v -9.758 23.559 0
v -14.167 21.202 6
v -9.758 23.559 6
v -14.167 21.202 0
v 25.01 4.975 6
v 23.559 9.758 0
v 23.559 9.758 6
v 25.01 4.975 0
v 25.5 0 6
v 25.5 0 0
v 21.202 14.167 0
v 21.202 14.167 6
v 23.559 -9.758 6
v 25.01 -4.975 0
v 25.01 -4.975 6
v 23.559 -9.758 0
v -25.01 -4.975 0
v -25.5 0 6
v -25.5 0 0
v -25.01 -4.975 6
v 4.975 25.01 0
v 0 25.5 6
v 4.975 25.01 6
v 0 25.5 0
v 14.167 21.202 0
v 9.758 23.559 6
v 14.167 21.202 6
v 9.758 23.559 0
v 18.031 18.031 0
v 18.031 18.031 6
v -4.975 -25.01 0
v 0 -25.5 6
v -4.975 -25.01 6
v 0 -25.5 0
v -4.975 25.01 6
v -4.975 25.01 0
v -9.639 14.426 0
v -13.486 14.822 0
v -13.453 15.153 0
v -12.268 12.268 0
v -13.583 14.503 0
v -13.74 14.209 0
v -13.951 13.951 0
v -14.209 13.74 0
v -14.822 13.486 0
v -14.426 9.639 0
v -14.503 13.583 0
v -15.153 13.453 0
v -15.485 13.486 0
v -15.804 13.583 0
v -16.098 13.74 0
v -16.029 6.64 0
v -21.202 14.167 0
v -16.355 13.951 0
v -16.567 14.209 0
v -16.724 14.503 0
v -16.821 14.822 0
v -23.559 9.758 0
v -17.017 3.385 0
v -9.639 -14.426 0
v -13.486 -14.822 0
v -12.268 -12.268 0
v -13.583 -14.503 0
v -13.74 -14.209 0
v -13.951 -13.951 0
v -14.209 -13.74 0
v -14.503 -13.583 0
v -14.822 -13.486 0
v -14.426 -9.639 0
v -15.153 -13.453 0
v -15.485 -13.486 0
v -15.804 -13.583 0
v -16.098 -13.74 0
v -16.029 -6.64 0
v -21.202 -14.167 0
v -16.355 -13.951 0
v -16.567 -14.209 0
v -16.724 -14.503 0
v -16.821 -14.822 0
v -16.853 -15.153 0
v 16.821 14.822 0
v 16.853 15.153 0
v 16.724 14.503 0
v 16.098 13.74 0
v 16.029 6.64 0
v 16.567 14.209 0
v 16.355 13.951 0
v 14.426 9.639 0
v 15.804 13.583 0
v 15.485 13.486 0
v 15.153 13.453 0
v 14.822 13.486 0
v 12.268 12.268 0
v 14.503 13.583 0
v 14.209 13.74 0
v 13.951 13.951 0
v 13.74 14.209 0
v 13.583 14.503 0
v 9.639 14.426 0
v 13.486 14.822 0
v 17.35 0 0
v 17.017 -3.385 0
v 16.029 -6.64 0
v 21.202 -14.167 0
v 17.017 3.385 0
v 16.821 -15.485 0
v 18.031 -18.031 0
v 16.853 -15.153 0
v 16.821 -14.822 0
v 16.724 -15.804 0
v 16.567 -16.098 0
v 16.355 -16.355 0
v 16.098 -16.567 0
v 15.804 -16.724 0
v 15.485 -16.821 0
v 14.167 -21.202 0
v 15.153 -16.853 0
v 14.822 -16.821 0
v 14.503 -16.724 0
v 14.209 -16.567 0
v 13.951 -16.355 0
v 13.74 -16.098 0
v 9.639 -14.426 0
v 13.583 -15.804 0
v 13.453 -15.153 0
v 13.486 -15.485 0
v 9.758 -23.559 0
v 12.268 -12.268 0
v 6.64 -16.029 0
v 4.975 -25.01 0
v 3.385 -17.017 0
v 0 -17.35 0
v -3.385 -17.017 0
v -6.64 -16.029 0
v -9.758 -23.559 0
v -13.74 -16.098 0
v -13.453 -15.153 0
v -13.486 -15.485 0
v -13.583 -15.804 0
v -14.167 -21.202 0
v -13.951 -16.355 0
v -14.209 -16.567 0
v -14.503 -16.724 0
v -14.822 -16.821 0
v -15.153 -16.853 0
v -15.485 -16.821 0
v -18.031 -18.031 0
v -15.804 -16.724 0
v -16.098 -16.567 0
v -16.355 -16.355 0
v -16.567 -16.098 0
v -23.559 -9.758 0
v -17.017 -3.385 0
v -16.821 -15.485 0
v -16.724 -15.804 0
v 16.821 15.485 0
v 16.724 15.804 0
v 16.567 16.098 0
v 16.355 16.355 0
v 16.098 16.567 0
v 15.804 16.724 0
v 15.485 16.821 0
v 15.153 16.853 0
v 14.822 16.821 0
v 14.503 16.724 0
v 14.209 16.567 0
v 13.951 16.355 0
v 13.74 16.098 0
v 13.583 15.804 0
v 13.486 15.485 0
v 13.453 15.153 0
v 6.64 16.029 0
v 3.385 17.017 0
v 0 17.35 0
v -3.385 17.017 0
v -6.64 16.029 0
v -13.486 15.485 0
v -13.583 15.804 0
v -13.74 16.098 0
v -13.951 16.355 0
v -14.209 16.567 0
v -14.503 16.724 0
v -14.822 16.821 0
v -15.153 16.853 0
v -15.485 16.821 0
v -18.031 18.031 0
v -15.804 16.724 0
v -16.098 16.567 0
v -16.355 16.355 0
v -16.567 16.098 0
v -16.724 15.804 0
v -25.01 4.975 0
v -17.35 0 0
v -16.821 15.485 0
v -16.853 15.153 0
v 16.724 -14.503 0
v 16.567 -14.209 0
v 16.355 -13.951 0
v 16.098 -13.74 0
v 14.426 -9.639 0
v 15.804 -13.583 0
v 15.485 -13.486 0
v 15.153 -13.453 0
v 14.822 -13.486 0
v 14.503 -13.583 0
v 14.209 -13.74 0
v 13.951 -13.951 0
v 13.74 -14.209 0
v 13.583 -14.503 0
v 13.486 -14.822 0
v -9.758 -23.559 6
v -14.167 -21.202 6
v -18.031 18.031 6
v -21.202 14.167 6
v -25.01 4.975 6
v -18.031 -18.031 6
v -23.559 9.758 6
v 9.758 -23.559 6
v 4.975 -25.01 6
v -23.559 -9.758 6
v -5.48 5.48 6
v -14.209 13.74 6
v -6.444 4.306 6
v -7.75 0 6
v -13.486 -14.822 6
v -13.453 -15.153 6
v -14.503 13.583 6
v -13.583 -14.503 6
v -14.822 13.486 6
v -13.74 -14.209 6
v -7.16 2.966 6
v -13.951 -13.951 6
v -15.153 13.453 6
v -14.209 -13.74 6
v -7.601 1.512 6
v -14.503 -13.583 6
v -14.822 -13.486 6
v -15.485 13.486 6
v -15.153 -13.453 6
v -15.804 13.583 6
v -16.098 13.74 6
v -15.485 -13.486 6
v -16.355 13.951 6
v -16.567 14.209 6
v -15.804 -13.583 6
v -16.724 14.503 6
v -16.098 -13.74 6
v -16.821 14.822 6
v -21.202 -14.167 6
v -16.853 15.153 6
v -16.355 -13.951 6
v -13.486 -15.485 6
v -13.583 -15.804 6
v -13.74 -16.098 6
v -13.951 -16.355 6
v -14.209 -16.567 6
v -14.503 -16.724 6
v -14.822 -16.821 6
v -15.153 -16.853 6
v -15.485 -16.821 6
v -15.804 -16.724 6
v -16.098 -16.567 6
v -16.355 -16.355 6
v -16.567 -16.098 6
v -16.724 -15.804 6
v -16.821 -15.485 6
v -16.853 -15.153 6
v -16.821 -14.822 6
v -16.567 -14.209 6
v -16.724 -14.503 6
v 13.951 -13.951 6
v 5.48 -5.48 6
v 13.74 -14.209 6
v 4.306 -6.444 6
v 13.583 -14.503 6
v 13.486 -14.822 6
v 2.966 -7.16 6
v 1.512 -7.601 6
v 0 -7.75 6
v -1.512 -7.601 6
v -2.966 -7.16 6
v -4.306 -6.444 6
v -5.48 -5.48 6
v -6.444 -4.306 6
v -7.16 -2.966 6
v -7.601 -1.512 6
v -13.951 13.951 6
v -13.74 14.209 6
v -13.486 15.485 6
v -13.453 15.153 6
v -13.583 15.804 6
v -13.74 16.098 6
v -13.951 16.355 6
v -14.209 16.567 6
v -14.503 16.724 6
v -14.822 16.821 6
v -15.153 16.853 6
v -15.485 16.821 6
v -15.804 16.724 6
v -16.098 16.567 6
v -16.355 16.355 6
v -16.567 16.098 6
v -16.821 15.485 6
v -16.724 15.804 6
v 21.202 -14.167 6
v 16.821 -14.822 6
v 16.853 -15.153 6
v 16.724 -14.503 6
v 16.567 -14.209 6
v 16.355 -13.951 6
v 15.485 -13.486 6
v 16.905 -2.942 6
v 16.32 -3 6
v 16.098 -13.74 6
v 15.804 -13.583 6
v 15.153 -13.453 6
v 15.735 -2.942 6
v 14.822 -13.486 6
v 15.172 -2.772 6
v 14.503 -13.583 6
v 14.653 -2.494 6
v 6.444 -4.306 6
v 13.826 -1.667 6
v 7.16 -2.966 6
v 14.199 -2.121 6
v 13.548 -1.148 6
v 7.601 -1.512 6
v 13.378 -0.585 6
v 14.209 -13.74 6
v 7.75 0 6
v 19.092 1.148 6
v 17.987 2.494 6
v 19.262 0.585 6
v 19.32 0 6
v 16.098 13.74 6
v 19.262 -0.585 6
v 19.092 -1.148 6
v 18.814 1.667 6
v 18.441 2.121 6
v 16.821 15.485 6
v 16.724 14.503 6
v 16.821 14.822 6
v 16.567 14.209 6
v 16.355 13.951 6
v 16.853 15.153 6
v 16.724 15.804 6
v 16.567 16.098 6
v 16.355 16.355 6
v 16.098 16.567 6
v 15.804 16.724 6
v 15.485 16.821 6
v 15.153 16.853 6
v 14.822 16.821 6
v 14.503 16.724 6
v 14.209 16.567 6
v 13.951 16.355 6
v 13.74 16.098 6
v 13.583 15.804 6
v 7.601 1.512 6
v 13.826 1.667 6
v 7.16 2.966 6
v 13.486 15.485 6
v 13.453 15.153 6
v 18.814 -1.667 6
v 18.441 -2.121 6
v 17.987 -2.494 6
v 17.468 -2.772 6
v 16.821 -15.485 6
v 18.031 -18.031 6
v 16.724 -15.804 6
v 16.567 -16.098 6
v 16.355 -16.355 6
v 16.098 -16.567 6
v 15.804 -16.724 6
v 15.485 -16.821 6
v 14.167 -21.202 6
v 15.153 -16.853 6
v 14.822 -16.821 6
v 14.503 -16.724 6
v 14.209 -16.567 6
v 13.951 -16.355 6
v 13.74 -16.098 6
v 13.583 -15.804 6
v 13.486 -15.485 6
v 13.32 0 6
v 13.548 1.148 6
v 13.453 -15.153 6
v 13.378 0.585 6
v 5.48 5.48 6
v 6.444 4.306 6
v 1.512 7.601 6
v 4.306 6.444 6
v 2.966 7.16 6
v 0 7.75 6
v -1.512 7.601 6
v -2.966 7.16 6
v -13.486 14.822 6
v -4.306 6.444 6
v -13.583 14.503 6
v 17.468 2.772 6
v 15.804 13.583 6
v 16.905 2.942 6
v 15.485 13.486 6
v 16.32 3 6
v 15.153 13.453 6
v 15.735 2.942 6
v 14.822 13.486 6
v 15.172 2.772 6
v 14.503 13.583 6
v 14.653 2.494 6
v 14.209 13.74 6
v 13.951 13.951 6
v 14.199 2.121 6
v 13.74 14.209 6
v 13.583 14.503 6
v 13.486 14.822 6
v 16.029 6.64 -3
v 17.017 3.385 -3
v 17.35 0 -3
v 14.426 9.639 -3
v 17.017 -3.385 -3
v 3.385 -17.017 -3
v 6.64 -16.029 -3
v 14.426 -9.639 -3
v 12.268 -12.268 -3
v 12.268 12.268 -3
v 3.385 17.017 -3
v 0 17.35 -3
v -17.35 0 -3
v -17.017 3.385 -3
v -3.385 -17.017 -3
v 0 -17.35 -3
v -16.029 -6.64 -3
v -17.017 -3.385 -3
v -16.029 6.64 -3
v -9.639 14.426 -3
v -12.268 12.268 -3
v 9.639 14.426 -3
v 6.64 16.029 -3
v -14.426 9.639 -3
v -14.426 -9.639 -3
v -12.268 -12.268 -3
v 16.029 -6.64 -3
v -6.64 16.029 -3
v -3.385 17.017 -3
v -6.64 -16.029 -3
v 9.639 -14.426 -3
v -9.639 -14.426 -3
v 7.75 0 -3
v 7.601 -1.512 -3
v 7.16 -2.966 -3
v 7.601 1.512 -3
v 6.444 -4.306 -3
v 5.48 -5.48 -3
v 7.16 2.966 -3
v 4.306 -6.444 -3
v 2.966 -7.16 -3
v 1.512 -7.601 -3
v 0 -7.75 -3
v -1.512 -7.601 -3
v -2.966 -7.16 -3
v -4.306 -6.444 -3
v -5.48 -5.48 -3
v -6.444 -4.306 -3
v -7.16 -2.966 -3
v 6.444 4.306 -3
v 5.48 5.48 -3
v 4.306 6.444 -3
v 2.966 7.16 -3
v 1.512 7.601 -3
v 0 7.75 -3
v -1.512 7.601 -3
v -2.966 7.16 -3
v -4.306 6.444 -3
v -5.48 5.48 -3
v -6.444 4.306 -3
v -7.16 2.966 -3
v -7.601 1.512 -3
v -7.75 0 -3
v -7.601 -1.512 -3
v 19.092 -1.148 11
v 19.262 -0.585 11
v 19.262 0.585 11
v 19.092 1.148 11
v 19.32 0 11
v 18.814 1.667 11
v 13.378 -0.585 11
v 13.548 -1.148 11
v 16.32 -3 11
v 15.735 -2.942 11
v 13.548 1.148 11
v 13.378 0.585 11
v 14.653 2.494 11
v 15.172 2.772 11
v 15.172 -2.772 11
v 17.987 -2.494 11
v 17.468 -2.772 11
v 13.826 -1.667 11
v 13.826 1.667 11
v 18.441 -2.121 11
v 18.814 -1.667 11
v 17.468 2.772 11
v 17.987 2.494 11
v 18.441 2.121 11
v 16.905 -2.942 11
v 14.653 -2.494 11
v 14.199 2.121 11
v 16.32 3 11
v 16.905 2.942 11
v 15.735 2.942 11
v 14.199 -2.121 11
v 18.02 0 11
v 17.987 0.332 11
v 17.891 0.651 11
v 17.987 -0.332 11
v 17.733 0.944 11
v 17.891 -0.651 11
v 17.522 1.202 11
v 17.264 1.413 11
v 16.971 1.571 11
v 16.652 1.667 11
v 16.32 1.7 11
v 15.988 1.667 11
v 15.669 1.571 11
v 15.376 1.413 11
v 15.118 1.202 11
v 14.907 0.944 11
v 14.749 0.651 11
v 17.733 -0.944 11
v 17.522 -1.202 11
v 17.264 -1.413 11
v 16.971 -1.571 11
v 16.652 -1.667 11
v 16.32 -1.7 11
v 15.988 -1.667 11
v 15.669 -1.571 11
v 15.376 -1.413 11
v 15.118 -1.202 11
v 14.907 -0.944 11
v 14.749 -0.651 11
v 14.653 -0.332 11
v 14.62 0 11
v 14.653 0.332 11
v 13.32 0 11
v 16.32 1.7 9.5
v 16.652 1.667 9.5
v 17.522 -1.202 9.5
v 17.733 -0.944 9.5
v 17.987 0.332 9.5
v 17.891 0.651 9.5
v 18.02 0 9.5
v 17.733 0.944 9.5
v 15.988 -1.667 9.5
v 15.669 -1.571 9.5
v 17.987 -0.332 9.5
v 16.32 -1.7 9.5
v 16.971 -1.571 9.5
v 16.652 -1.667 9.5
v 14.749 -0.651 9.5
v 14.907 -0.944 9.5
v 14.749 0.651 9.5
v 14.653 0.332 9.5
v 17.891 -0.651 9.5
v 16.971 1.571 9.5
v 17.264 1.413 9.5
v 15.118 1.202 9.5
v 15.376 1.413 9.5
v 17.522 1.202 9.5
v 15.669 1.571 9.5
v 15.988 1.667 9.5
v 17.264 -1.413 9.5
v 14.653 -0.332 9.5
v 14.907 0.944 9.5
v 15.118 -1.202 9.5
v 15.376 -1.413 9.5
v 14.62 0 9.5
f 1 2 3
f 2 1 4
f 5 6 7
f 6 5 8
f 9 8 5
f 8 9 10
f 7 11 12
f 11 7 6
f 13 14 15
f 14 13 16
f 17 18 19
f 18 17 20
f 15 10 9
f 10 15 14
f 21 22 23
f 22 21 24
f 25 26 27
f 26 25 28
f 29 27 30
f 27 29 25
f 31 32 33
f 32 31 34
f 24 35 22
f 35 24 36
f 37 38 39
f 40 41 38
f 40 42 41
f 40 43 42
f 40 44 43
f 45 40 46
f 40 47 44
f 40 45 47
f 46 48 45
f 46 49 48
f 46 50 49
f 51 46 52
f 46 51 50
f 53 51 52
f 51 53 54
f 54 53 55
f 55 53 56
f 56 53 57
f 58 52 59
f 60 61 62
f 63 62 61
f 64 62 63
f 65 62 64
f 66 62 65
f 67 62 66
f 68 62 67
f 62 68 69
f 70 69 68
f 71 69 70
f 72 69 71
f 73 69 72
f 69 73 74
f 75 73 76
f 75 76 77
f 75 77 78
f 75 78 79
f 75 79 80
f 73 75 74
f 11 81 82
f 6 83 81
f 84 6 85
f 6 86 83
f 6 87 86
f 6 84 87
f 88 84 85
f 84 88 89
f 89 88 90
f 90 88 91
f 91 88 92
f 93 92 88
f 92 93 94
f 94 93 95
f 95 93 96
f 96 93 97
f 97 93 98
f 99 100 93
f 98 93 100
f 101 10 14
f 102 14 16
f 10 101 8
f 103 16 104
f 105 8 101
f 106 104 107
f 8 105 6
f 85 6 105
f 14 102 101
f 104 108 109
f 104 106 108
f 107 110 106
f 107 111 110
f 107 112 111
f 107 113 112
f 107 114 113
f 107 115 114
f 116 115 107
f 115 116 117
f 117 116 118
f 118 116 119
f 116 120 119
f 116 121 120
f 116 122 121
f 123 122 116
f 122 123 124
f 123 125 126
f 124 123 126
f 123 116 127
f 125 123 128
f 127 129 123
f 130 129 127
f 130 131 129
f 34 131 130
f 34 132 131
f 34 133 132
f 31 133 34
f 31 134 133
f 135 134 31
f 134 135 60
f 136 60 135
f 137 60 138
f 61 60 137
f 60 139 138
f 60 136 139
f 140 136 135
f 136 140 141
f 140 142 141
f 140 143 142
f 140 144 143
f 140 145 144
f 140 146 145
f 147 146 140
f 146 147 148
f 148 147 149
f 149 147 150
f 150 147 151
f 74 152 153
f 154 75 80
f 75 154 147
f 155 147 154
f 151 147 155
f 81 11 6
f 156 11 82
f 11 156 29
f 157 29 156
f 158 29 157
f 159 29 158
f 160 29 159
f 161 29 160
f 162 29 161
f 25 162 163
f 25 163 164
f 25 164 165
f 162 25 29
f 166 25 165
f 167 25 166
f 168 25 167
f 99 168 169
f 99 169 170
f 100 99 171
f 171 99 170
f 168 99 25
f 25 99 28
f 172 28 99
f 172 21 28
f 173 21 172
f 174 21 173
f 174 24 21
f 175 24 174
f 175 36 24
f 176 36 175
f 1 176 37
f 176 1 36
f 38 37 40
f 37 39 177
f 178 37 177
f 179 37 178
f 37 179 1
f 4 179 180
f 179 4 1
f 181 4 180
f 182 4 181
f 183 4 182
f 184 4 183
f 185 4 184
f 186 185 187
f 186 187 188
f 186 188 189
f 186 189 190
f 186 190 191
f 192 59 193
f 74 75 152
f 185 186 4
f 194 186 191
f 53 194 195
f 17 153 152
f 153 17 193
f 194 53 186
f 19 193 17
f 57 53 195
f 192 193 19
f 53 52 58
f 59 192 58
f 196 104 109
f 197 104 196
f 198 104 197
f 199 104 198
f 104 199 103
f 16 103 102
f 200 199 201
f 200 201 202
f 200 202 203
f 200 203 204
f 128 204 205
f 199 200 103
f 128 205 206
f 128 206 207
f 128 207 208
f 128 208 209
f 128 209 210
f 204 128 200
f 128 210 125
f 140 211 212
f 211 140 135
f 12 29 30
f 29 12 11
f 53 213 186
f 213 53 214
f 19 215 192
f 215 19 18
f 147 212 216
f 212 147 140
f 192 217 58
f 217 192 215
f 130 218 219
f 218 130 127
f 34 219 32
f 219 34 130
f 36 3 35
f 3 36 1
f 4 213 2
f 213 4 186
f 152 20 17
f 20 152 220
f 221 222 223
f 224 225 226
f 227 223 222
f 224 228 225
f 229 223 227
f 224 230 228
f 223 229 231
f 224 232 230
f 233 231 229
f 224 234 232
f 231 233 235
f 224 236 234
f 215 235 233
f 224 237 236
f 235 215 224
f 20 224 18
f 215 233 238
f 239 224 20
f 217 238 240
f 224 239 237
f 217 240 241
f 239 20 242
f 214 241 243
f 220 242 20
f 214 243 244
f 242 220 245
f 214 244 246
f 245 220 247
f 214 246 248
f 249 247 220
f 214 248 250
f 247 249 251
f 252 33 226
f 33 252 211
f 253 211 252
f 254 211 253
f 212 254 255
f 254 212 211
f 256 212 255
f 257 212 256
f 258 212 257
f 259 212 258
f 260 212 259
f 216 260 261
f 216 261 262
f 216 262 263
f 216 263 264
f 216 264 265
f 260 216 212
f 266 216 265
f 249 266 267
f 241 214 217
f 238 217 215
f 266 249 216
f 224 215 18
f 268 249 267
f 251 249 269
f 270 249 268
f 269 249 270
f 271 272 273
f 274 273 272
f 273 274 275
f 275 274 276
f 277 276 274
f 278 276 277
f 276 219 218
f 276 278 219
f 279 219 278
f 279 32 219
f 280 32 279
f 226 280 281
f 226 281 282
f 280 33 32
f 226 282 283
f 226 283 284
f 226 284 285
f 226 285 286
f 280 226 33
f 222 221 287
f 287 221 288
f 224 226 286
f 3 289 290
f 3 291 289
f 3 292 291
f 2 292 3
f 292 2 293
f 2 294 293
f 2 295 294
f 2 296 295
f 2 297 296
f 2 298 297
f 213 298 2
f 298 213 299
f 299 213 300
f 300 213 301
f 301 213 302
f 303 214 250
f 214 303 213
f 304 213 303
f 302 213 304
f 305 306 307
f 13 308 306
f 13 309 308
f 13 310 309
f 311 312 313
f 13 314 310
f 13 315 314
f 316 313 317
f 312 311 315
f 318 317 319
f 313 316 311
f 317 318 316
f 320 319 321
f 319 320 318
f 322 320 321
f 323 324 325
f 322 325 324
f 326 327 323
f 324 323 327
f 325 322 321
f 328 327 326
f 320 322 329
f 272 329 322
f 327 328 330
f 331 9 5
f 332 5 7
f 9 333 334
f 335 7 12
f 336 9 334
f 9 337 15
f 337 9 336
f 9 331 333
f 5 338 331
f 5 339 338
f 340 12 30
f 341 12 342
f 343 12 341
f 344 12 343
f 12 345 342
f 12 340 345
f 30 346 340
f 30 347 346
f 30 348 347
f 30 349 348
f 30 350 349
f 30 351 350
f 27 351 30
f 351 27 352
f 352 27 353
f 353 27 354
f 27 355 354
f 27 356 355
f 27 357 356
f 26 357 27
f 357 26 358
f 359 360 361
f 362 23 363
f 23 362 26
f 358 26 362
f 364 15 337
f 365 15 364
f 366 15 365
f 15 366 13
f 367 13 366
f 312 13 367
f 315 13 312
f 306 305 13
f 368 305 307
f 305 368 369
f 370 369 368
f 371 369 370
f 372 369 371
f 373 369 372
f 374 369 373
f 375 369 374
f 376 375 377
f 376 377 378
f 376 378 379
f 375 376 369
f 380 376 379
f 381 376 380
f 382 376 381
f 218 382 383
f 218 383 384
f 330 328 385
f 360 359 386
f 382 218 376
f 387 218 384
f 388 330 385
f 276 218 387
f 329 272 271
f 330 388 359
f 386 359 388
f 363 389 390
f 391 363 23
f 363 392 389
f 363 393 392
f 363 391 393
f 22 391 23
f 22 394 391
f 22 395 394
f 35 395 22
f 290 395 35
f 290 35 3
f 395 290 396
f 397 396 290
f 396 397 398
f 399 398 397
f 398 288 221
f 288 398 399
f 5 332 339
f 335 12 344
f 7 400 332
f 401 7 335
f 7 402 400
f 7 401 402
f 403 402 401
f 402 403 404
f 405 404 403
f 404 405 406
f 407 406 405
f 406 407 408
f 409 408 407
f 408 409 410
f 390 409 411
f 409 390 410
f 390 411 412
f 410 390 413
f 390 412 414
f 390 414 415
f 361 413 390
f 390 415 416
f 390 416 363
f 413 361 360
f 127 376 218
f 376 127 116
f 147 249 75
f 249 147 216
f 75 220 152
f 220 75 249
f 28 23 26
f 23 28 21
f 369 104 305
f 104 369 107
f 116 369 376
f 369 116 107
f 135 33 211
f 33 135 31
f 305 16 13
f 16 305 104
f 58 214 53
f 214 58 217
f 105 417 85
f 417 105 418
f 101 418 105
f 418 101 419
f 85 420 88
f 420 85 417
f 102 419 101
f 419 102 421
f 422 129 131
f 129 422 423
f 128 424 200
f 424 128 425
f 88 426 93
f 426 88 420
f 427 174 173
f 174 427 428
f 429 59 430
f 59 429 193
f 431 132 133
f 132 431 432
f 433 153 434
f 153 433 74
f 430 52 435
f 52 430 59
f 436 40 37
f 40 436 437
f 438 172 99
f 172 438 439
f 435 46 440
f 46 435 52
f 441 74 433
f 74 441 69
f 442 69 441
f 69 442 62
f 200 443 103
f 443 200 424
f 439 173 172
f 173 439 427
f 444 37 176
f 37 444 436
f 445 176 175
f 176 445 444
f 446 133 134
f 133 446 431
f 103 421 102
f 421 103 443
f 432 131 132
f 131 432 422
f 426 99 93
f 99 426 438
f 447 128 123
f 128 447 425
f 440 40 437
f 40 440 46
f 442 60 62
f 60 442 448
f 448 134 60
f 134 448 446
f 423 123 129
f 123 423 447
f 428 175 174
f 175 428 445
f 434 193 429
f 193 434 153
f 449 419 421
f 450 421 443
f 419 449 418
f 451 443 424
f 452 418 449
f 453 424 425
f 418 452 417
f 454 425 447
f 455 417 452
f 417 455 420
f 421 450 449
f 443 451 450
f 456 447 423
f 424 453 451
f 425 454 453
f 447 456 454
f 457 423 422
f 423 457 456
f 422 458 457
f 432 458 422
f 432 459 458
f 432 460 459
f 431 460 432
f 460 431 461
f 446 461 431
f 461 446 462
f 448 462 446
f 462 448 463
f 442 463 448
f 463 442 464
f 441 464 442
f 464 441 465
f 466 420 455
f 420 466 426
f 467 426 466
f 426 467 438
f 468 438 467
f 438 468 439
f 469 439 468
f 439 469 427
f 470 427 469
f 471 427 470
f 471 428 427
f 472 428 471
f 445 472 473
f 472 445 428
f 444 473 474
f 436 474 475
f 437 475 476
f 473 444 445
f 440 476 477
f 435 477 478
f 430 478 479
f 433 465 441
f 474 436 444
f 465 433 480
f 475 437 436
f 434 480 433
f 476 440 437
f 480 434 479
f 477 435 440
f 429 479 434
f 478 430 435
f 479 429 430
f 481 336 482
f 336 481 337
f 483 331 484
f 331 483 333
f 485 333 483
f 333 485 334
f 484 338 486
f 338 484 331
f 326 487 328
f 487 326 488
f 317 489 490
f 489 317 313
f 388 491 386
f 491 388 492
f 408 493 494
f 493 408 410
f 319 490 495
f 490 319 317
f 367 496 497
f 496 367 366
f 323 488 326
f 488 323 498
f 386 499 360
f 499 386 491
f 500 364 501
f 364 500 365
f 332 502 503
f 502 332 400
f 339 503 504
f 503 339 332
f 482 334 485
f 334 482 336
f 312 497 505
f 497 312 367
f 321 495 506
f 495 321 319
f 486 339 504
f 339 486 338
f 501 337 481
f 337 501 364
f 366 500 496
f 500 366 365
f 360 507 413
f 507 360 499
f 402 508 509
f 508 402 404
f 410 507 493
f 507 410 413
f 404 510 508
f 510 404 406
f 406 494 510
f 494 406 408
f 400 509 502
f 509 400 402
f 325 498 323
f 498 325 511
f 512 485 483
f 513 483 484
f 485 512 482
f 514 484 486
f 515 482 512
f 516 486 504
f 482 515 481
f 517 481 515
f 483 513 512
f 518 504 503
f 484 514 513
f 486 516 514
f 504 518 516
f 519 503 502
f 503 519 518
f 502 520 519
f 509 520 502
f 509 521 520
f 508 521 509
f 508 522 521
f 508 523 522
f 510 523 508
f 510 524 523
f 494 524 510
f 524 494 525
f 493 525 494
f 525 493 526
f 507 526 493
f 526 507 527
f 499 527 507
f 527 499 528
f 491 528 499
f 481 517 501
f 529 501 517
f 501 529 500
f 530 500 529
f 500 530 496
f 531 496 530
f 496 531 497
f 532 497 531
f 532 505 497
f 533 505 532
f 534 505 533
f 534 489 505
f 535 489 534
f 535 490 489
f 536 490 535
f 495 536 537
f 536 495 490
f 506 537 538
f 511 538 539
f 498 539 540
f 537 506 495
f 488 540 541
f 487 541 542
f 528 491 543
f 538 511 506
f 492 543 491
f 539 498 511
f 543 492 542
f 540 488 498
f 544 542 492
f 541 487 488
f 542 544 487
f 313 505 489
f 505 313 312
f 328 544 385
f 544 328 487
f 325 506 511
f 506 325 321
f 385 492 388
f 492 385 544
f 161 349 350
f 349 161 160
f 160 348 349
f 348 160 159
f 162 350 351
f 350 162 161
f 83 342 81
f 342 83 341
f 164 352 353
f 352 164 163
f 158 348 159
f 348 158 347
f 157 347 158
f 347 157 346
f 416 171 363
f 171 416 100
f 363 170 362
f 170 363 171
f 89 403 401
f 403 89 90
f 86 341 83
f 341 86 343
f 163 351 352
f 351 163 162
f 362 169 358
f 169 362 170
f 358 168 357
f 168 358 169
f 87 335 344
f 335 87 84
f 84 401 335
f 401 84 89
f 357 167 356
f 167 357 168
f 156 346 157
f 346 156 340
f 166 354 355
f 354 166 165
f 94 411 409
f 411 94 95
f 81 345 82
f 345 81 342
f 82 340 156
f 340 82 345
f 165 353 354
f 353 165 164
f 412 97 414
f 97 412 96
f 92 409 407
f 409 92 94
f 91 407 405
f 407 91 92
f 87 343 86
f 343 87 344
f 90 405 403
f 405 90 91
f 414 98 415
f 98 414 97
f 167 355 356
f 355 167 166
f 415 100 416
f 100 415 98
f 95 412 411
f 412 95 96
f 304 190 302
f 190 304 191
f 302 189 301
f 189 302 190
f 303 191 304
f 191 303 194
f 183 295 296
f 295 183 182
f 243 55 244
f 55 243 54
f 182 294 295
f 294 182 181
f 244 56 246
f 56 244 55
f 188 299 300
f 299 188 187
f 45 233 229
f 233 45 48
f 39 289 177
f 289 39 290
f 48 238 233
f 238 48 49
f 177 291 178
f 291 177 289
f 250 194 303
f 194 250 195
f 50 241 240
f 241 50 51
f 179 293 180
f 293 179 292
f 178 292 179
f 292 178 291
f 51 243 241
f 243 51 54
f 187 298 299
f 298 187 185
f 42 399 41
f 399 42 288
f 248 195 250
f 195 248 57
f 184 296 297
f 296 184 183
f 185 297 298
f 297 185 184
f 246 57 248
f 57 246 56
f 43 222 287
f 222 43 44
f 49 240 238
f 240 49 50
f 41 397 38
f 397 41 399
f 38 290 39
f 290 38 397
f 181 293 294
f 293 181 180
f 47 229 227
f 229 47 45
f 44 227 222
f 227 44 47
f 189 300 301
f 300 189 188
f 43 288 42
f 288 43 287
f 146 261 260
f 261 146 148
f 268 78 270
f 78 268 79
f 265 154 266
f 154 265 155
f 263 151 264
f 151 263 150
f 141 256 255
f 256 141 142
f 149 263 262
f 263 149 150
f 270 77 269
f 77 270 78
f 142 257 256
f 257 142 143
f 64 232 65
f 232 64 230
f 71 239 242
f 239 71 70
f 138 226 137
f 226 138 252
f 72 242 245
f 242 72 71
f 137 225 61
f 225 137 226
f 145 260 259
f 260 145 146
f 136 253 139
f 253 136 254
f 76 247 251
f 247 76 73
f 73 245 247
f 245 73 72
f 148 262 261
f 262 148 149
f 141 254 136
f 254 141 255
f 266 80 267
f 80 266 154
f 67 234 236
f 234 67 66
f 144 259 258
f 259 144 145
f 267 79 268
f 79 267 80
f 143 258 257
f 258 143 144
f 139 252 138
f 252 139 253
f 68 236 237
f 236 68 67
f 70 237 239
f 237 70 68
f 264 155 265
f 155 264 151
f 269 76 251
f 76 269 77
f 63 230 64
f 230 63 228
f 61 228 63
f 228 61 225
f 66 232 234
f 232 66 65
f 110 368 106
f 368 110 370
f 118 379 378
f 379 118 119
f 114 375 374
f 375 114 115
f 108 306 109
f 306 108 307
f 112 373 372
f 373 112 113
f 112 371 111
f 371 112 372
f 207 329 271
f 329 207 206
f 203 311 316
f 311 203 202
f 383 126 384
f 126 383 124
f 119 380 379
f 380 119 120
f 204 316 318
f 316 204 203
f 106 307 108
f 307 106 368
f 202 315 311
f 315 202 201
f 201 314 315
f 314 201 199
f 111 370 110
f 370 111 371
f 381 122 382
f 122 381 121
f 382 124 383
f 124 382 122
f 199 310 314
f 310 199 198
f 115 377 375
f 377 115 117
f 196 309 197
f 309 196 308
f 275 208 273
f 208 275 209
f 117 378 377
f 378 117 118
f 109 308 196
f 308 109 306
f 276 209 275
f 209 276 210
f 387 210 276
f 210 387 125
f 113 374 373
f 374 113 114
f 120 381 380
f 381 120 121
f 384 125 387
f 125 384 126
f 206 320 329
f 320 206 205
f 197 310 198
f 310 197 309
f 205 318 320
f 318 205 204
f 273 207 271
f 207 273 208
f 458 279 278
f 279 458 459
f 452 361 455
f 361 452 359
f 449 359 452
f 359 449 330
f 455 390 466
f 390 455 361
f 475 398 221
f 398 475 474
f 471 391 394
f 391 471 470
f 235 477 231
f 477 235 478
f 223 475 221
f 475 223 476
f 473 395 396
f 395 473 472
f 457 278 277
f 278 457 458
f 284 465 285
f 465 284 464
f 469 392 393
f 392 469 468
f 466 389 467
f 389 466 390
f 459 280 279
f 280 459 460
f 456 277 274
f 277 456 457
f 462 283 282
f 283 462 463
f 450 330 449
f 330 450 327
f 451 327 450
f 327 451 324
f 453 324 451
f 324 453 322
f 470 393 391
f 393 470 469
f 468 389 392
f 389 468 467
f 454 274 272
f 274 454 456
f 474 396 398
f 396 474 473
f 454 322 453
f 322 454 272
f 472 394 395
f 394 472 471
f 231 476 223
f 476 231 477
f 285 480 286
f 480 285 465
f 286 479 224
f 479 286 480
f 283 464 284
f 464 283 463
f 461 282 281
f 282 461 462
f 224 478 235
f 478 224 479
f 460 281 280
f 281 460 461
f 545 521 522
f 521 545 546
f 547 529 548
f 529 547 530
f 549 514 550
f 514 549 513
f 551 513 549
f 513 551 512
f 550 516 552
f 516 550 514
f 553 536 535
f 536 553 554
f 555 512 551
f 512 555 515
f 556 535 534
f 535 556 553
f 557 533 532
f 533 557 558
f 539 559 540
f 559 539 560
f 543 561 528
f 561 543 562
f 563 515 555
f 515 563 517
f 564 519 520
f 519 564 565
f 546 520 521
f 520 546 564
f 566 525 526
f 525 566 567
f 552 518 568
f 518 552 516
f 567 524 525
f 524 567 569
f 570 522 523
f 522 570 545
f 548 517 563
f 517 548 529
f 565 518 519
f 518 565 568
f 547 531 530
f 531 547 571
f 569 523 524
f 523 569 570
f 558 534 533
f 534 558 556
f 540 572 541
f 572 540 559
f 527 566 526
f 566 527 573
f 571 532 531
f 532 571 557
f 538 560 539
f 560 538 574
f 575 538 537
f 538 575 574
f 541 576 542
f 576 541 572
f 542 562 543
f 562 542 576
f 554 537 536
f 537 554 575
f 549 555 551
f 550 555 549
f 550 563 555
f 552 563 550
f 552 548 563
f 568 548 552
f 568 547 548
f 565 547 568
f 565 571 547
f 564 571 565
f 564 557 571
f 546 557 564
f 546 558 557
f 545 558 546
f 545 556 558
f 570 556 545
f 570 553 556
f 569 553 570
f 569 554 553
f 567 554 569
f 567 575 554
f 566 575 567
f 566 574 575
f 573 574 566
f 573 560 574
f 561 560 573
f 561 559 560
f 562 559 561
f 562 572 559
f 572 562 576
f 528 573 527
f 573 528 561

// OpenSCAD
$fn = 32;
// ----------------------------------------------------------------------
// Retaining cap: 6202 cover, 51 mm, spigot 34.7 mm
// ----------------------------------------------------------------------

// --- parameters (mm) ---
cover_d = 51;             // cover diameter
cover_t = 6;              // cover thickness
spigot_d = 34.7;          // spigot that enters the housing
spigot_h = 3;             // spigot height
shaft_d = 15.5;           // shaft opening
bolt_d = 3.4;             // bolt clearance
bolt_r = 21.43;           // bolt circle radius
nipple_d = 6;             // grease nipple boss
nipple_h = 5;             // grease nipple boss height

module cover() {
  cylinder(h = cover_t, d = cover_d);
}

module spigot() {
  /* sunk 1 mm into the cover; the spigot sets the overall height */
  translate([0, 0, -spigot_h]) cylinder(h = spigot_h + 1, d = spigot_d);
}

module nipple() {
  translate([cover_d * 0.32, 0, cover_t - 1])
    cylinder(h = nipple_h + 1, d = nipple_d);
}

difference() {
  union() {
    cover();
    spigot();
    nipple();
  }
  for (i = [0 : 3]) rotate([0, 0, 45 + i * 90]) translate([bolt_r, 0, -spigot_h - 1])
    cylinder(h = spigot_h + cover_t + 2, d = bolt_d);
  translate([0, 0, -spigot_h - 1]) cylinder(h = spigot_h + cover_t + 2, d = shaft_d);
  translate([cover_d * 0.32, 0, cover_t + nipple_h - 1.5]) cylinder(h = 4, d = 3.4);
}
